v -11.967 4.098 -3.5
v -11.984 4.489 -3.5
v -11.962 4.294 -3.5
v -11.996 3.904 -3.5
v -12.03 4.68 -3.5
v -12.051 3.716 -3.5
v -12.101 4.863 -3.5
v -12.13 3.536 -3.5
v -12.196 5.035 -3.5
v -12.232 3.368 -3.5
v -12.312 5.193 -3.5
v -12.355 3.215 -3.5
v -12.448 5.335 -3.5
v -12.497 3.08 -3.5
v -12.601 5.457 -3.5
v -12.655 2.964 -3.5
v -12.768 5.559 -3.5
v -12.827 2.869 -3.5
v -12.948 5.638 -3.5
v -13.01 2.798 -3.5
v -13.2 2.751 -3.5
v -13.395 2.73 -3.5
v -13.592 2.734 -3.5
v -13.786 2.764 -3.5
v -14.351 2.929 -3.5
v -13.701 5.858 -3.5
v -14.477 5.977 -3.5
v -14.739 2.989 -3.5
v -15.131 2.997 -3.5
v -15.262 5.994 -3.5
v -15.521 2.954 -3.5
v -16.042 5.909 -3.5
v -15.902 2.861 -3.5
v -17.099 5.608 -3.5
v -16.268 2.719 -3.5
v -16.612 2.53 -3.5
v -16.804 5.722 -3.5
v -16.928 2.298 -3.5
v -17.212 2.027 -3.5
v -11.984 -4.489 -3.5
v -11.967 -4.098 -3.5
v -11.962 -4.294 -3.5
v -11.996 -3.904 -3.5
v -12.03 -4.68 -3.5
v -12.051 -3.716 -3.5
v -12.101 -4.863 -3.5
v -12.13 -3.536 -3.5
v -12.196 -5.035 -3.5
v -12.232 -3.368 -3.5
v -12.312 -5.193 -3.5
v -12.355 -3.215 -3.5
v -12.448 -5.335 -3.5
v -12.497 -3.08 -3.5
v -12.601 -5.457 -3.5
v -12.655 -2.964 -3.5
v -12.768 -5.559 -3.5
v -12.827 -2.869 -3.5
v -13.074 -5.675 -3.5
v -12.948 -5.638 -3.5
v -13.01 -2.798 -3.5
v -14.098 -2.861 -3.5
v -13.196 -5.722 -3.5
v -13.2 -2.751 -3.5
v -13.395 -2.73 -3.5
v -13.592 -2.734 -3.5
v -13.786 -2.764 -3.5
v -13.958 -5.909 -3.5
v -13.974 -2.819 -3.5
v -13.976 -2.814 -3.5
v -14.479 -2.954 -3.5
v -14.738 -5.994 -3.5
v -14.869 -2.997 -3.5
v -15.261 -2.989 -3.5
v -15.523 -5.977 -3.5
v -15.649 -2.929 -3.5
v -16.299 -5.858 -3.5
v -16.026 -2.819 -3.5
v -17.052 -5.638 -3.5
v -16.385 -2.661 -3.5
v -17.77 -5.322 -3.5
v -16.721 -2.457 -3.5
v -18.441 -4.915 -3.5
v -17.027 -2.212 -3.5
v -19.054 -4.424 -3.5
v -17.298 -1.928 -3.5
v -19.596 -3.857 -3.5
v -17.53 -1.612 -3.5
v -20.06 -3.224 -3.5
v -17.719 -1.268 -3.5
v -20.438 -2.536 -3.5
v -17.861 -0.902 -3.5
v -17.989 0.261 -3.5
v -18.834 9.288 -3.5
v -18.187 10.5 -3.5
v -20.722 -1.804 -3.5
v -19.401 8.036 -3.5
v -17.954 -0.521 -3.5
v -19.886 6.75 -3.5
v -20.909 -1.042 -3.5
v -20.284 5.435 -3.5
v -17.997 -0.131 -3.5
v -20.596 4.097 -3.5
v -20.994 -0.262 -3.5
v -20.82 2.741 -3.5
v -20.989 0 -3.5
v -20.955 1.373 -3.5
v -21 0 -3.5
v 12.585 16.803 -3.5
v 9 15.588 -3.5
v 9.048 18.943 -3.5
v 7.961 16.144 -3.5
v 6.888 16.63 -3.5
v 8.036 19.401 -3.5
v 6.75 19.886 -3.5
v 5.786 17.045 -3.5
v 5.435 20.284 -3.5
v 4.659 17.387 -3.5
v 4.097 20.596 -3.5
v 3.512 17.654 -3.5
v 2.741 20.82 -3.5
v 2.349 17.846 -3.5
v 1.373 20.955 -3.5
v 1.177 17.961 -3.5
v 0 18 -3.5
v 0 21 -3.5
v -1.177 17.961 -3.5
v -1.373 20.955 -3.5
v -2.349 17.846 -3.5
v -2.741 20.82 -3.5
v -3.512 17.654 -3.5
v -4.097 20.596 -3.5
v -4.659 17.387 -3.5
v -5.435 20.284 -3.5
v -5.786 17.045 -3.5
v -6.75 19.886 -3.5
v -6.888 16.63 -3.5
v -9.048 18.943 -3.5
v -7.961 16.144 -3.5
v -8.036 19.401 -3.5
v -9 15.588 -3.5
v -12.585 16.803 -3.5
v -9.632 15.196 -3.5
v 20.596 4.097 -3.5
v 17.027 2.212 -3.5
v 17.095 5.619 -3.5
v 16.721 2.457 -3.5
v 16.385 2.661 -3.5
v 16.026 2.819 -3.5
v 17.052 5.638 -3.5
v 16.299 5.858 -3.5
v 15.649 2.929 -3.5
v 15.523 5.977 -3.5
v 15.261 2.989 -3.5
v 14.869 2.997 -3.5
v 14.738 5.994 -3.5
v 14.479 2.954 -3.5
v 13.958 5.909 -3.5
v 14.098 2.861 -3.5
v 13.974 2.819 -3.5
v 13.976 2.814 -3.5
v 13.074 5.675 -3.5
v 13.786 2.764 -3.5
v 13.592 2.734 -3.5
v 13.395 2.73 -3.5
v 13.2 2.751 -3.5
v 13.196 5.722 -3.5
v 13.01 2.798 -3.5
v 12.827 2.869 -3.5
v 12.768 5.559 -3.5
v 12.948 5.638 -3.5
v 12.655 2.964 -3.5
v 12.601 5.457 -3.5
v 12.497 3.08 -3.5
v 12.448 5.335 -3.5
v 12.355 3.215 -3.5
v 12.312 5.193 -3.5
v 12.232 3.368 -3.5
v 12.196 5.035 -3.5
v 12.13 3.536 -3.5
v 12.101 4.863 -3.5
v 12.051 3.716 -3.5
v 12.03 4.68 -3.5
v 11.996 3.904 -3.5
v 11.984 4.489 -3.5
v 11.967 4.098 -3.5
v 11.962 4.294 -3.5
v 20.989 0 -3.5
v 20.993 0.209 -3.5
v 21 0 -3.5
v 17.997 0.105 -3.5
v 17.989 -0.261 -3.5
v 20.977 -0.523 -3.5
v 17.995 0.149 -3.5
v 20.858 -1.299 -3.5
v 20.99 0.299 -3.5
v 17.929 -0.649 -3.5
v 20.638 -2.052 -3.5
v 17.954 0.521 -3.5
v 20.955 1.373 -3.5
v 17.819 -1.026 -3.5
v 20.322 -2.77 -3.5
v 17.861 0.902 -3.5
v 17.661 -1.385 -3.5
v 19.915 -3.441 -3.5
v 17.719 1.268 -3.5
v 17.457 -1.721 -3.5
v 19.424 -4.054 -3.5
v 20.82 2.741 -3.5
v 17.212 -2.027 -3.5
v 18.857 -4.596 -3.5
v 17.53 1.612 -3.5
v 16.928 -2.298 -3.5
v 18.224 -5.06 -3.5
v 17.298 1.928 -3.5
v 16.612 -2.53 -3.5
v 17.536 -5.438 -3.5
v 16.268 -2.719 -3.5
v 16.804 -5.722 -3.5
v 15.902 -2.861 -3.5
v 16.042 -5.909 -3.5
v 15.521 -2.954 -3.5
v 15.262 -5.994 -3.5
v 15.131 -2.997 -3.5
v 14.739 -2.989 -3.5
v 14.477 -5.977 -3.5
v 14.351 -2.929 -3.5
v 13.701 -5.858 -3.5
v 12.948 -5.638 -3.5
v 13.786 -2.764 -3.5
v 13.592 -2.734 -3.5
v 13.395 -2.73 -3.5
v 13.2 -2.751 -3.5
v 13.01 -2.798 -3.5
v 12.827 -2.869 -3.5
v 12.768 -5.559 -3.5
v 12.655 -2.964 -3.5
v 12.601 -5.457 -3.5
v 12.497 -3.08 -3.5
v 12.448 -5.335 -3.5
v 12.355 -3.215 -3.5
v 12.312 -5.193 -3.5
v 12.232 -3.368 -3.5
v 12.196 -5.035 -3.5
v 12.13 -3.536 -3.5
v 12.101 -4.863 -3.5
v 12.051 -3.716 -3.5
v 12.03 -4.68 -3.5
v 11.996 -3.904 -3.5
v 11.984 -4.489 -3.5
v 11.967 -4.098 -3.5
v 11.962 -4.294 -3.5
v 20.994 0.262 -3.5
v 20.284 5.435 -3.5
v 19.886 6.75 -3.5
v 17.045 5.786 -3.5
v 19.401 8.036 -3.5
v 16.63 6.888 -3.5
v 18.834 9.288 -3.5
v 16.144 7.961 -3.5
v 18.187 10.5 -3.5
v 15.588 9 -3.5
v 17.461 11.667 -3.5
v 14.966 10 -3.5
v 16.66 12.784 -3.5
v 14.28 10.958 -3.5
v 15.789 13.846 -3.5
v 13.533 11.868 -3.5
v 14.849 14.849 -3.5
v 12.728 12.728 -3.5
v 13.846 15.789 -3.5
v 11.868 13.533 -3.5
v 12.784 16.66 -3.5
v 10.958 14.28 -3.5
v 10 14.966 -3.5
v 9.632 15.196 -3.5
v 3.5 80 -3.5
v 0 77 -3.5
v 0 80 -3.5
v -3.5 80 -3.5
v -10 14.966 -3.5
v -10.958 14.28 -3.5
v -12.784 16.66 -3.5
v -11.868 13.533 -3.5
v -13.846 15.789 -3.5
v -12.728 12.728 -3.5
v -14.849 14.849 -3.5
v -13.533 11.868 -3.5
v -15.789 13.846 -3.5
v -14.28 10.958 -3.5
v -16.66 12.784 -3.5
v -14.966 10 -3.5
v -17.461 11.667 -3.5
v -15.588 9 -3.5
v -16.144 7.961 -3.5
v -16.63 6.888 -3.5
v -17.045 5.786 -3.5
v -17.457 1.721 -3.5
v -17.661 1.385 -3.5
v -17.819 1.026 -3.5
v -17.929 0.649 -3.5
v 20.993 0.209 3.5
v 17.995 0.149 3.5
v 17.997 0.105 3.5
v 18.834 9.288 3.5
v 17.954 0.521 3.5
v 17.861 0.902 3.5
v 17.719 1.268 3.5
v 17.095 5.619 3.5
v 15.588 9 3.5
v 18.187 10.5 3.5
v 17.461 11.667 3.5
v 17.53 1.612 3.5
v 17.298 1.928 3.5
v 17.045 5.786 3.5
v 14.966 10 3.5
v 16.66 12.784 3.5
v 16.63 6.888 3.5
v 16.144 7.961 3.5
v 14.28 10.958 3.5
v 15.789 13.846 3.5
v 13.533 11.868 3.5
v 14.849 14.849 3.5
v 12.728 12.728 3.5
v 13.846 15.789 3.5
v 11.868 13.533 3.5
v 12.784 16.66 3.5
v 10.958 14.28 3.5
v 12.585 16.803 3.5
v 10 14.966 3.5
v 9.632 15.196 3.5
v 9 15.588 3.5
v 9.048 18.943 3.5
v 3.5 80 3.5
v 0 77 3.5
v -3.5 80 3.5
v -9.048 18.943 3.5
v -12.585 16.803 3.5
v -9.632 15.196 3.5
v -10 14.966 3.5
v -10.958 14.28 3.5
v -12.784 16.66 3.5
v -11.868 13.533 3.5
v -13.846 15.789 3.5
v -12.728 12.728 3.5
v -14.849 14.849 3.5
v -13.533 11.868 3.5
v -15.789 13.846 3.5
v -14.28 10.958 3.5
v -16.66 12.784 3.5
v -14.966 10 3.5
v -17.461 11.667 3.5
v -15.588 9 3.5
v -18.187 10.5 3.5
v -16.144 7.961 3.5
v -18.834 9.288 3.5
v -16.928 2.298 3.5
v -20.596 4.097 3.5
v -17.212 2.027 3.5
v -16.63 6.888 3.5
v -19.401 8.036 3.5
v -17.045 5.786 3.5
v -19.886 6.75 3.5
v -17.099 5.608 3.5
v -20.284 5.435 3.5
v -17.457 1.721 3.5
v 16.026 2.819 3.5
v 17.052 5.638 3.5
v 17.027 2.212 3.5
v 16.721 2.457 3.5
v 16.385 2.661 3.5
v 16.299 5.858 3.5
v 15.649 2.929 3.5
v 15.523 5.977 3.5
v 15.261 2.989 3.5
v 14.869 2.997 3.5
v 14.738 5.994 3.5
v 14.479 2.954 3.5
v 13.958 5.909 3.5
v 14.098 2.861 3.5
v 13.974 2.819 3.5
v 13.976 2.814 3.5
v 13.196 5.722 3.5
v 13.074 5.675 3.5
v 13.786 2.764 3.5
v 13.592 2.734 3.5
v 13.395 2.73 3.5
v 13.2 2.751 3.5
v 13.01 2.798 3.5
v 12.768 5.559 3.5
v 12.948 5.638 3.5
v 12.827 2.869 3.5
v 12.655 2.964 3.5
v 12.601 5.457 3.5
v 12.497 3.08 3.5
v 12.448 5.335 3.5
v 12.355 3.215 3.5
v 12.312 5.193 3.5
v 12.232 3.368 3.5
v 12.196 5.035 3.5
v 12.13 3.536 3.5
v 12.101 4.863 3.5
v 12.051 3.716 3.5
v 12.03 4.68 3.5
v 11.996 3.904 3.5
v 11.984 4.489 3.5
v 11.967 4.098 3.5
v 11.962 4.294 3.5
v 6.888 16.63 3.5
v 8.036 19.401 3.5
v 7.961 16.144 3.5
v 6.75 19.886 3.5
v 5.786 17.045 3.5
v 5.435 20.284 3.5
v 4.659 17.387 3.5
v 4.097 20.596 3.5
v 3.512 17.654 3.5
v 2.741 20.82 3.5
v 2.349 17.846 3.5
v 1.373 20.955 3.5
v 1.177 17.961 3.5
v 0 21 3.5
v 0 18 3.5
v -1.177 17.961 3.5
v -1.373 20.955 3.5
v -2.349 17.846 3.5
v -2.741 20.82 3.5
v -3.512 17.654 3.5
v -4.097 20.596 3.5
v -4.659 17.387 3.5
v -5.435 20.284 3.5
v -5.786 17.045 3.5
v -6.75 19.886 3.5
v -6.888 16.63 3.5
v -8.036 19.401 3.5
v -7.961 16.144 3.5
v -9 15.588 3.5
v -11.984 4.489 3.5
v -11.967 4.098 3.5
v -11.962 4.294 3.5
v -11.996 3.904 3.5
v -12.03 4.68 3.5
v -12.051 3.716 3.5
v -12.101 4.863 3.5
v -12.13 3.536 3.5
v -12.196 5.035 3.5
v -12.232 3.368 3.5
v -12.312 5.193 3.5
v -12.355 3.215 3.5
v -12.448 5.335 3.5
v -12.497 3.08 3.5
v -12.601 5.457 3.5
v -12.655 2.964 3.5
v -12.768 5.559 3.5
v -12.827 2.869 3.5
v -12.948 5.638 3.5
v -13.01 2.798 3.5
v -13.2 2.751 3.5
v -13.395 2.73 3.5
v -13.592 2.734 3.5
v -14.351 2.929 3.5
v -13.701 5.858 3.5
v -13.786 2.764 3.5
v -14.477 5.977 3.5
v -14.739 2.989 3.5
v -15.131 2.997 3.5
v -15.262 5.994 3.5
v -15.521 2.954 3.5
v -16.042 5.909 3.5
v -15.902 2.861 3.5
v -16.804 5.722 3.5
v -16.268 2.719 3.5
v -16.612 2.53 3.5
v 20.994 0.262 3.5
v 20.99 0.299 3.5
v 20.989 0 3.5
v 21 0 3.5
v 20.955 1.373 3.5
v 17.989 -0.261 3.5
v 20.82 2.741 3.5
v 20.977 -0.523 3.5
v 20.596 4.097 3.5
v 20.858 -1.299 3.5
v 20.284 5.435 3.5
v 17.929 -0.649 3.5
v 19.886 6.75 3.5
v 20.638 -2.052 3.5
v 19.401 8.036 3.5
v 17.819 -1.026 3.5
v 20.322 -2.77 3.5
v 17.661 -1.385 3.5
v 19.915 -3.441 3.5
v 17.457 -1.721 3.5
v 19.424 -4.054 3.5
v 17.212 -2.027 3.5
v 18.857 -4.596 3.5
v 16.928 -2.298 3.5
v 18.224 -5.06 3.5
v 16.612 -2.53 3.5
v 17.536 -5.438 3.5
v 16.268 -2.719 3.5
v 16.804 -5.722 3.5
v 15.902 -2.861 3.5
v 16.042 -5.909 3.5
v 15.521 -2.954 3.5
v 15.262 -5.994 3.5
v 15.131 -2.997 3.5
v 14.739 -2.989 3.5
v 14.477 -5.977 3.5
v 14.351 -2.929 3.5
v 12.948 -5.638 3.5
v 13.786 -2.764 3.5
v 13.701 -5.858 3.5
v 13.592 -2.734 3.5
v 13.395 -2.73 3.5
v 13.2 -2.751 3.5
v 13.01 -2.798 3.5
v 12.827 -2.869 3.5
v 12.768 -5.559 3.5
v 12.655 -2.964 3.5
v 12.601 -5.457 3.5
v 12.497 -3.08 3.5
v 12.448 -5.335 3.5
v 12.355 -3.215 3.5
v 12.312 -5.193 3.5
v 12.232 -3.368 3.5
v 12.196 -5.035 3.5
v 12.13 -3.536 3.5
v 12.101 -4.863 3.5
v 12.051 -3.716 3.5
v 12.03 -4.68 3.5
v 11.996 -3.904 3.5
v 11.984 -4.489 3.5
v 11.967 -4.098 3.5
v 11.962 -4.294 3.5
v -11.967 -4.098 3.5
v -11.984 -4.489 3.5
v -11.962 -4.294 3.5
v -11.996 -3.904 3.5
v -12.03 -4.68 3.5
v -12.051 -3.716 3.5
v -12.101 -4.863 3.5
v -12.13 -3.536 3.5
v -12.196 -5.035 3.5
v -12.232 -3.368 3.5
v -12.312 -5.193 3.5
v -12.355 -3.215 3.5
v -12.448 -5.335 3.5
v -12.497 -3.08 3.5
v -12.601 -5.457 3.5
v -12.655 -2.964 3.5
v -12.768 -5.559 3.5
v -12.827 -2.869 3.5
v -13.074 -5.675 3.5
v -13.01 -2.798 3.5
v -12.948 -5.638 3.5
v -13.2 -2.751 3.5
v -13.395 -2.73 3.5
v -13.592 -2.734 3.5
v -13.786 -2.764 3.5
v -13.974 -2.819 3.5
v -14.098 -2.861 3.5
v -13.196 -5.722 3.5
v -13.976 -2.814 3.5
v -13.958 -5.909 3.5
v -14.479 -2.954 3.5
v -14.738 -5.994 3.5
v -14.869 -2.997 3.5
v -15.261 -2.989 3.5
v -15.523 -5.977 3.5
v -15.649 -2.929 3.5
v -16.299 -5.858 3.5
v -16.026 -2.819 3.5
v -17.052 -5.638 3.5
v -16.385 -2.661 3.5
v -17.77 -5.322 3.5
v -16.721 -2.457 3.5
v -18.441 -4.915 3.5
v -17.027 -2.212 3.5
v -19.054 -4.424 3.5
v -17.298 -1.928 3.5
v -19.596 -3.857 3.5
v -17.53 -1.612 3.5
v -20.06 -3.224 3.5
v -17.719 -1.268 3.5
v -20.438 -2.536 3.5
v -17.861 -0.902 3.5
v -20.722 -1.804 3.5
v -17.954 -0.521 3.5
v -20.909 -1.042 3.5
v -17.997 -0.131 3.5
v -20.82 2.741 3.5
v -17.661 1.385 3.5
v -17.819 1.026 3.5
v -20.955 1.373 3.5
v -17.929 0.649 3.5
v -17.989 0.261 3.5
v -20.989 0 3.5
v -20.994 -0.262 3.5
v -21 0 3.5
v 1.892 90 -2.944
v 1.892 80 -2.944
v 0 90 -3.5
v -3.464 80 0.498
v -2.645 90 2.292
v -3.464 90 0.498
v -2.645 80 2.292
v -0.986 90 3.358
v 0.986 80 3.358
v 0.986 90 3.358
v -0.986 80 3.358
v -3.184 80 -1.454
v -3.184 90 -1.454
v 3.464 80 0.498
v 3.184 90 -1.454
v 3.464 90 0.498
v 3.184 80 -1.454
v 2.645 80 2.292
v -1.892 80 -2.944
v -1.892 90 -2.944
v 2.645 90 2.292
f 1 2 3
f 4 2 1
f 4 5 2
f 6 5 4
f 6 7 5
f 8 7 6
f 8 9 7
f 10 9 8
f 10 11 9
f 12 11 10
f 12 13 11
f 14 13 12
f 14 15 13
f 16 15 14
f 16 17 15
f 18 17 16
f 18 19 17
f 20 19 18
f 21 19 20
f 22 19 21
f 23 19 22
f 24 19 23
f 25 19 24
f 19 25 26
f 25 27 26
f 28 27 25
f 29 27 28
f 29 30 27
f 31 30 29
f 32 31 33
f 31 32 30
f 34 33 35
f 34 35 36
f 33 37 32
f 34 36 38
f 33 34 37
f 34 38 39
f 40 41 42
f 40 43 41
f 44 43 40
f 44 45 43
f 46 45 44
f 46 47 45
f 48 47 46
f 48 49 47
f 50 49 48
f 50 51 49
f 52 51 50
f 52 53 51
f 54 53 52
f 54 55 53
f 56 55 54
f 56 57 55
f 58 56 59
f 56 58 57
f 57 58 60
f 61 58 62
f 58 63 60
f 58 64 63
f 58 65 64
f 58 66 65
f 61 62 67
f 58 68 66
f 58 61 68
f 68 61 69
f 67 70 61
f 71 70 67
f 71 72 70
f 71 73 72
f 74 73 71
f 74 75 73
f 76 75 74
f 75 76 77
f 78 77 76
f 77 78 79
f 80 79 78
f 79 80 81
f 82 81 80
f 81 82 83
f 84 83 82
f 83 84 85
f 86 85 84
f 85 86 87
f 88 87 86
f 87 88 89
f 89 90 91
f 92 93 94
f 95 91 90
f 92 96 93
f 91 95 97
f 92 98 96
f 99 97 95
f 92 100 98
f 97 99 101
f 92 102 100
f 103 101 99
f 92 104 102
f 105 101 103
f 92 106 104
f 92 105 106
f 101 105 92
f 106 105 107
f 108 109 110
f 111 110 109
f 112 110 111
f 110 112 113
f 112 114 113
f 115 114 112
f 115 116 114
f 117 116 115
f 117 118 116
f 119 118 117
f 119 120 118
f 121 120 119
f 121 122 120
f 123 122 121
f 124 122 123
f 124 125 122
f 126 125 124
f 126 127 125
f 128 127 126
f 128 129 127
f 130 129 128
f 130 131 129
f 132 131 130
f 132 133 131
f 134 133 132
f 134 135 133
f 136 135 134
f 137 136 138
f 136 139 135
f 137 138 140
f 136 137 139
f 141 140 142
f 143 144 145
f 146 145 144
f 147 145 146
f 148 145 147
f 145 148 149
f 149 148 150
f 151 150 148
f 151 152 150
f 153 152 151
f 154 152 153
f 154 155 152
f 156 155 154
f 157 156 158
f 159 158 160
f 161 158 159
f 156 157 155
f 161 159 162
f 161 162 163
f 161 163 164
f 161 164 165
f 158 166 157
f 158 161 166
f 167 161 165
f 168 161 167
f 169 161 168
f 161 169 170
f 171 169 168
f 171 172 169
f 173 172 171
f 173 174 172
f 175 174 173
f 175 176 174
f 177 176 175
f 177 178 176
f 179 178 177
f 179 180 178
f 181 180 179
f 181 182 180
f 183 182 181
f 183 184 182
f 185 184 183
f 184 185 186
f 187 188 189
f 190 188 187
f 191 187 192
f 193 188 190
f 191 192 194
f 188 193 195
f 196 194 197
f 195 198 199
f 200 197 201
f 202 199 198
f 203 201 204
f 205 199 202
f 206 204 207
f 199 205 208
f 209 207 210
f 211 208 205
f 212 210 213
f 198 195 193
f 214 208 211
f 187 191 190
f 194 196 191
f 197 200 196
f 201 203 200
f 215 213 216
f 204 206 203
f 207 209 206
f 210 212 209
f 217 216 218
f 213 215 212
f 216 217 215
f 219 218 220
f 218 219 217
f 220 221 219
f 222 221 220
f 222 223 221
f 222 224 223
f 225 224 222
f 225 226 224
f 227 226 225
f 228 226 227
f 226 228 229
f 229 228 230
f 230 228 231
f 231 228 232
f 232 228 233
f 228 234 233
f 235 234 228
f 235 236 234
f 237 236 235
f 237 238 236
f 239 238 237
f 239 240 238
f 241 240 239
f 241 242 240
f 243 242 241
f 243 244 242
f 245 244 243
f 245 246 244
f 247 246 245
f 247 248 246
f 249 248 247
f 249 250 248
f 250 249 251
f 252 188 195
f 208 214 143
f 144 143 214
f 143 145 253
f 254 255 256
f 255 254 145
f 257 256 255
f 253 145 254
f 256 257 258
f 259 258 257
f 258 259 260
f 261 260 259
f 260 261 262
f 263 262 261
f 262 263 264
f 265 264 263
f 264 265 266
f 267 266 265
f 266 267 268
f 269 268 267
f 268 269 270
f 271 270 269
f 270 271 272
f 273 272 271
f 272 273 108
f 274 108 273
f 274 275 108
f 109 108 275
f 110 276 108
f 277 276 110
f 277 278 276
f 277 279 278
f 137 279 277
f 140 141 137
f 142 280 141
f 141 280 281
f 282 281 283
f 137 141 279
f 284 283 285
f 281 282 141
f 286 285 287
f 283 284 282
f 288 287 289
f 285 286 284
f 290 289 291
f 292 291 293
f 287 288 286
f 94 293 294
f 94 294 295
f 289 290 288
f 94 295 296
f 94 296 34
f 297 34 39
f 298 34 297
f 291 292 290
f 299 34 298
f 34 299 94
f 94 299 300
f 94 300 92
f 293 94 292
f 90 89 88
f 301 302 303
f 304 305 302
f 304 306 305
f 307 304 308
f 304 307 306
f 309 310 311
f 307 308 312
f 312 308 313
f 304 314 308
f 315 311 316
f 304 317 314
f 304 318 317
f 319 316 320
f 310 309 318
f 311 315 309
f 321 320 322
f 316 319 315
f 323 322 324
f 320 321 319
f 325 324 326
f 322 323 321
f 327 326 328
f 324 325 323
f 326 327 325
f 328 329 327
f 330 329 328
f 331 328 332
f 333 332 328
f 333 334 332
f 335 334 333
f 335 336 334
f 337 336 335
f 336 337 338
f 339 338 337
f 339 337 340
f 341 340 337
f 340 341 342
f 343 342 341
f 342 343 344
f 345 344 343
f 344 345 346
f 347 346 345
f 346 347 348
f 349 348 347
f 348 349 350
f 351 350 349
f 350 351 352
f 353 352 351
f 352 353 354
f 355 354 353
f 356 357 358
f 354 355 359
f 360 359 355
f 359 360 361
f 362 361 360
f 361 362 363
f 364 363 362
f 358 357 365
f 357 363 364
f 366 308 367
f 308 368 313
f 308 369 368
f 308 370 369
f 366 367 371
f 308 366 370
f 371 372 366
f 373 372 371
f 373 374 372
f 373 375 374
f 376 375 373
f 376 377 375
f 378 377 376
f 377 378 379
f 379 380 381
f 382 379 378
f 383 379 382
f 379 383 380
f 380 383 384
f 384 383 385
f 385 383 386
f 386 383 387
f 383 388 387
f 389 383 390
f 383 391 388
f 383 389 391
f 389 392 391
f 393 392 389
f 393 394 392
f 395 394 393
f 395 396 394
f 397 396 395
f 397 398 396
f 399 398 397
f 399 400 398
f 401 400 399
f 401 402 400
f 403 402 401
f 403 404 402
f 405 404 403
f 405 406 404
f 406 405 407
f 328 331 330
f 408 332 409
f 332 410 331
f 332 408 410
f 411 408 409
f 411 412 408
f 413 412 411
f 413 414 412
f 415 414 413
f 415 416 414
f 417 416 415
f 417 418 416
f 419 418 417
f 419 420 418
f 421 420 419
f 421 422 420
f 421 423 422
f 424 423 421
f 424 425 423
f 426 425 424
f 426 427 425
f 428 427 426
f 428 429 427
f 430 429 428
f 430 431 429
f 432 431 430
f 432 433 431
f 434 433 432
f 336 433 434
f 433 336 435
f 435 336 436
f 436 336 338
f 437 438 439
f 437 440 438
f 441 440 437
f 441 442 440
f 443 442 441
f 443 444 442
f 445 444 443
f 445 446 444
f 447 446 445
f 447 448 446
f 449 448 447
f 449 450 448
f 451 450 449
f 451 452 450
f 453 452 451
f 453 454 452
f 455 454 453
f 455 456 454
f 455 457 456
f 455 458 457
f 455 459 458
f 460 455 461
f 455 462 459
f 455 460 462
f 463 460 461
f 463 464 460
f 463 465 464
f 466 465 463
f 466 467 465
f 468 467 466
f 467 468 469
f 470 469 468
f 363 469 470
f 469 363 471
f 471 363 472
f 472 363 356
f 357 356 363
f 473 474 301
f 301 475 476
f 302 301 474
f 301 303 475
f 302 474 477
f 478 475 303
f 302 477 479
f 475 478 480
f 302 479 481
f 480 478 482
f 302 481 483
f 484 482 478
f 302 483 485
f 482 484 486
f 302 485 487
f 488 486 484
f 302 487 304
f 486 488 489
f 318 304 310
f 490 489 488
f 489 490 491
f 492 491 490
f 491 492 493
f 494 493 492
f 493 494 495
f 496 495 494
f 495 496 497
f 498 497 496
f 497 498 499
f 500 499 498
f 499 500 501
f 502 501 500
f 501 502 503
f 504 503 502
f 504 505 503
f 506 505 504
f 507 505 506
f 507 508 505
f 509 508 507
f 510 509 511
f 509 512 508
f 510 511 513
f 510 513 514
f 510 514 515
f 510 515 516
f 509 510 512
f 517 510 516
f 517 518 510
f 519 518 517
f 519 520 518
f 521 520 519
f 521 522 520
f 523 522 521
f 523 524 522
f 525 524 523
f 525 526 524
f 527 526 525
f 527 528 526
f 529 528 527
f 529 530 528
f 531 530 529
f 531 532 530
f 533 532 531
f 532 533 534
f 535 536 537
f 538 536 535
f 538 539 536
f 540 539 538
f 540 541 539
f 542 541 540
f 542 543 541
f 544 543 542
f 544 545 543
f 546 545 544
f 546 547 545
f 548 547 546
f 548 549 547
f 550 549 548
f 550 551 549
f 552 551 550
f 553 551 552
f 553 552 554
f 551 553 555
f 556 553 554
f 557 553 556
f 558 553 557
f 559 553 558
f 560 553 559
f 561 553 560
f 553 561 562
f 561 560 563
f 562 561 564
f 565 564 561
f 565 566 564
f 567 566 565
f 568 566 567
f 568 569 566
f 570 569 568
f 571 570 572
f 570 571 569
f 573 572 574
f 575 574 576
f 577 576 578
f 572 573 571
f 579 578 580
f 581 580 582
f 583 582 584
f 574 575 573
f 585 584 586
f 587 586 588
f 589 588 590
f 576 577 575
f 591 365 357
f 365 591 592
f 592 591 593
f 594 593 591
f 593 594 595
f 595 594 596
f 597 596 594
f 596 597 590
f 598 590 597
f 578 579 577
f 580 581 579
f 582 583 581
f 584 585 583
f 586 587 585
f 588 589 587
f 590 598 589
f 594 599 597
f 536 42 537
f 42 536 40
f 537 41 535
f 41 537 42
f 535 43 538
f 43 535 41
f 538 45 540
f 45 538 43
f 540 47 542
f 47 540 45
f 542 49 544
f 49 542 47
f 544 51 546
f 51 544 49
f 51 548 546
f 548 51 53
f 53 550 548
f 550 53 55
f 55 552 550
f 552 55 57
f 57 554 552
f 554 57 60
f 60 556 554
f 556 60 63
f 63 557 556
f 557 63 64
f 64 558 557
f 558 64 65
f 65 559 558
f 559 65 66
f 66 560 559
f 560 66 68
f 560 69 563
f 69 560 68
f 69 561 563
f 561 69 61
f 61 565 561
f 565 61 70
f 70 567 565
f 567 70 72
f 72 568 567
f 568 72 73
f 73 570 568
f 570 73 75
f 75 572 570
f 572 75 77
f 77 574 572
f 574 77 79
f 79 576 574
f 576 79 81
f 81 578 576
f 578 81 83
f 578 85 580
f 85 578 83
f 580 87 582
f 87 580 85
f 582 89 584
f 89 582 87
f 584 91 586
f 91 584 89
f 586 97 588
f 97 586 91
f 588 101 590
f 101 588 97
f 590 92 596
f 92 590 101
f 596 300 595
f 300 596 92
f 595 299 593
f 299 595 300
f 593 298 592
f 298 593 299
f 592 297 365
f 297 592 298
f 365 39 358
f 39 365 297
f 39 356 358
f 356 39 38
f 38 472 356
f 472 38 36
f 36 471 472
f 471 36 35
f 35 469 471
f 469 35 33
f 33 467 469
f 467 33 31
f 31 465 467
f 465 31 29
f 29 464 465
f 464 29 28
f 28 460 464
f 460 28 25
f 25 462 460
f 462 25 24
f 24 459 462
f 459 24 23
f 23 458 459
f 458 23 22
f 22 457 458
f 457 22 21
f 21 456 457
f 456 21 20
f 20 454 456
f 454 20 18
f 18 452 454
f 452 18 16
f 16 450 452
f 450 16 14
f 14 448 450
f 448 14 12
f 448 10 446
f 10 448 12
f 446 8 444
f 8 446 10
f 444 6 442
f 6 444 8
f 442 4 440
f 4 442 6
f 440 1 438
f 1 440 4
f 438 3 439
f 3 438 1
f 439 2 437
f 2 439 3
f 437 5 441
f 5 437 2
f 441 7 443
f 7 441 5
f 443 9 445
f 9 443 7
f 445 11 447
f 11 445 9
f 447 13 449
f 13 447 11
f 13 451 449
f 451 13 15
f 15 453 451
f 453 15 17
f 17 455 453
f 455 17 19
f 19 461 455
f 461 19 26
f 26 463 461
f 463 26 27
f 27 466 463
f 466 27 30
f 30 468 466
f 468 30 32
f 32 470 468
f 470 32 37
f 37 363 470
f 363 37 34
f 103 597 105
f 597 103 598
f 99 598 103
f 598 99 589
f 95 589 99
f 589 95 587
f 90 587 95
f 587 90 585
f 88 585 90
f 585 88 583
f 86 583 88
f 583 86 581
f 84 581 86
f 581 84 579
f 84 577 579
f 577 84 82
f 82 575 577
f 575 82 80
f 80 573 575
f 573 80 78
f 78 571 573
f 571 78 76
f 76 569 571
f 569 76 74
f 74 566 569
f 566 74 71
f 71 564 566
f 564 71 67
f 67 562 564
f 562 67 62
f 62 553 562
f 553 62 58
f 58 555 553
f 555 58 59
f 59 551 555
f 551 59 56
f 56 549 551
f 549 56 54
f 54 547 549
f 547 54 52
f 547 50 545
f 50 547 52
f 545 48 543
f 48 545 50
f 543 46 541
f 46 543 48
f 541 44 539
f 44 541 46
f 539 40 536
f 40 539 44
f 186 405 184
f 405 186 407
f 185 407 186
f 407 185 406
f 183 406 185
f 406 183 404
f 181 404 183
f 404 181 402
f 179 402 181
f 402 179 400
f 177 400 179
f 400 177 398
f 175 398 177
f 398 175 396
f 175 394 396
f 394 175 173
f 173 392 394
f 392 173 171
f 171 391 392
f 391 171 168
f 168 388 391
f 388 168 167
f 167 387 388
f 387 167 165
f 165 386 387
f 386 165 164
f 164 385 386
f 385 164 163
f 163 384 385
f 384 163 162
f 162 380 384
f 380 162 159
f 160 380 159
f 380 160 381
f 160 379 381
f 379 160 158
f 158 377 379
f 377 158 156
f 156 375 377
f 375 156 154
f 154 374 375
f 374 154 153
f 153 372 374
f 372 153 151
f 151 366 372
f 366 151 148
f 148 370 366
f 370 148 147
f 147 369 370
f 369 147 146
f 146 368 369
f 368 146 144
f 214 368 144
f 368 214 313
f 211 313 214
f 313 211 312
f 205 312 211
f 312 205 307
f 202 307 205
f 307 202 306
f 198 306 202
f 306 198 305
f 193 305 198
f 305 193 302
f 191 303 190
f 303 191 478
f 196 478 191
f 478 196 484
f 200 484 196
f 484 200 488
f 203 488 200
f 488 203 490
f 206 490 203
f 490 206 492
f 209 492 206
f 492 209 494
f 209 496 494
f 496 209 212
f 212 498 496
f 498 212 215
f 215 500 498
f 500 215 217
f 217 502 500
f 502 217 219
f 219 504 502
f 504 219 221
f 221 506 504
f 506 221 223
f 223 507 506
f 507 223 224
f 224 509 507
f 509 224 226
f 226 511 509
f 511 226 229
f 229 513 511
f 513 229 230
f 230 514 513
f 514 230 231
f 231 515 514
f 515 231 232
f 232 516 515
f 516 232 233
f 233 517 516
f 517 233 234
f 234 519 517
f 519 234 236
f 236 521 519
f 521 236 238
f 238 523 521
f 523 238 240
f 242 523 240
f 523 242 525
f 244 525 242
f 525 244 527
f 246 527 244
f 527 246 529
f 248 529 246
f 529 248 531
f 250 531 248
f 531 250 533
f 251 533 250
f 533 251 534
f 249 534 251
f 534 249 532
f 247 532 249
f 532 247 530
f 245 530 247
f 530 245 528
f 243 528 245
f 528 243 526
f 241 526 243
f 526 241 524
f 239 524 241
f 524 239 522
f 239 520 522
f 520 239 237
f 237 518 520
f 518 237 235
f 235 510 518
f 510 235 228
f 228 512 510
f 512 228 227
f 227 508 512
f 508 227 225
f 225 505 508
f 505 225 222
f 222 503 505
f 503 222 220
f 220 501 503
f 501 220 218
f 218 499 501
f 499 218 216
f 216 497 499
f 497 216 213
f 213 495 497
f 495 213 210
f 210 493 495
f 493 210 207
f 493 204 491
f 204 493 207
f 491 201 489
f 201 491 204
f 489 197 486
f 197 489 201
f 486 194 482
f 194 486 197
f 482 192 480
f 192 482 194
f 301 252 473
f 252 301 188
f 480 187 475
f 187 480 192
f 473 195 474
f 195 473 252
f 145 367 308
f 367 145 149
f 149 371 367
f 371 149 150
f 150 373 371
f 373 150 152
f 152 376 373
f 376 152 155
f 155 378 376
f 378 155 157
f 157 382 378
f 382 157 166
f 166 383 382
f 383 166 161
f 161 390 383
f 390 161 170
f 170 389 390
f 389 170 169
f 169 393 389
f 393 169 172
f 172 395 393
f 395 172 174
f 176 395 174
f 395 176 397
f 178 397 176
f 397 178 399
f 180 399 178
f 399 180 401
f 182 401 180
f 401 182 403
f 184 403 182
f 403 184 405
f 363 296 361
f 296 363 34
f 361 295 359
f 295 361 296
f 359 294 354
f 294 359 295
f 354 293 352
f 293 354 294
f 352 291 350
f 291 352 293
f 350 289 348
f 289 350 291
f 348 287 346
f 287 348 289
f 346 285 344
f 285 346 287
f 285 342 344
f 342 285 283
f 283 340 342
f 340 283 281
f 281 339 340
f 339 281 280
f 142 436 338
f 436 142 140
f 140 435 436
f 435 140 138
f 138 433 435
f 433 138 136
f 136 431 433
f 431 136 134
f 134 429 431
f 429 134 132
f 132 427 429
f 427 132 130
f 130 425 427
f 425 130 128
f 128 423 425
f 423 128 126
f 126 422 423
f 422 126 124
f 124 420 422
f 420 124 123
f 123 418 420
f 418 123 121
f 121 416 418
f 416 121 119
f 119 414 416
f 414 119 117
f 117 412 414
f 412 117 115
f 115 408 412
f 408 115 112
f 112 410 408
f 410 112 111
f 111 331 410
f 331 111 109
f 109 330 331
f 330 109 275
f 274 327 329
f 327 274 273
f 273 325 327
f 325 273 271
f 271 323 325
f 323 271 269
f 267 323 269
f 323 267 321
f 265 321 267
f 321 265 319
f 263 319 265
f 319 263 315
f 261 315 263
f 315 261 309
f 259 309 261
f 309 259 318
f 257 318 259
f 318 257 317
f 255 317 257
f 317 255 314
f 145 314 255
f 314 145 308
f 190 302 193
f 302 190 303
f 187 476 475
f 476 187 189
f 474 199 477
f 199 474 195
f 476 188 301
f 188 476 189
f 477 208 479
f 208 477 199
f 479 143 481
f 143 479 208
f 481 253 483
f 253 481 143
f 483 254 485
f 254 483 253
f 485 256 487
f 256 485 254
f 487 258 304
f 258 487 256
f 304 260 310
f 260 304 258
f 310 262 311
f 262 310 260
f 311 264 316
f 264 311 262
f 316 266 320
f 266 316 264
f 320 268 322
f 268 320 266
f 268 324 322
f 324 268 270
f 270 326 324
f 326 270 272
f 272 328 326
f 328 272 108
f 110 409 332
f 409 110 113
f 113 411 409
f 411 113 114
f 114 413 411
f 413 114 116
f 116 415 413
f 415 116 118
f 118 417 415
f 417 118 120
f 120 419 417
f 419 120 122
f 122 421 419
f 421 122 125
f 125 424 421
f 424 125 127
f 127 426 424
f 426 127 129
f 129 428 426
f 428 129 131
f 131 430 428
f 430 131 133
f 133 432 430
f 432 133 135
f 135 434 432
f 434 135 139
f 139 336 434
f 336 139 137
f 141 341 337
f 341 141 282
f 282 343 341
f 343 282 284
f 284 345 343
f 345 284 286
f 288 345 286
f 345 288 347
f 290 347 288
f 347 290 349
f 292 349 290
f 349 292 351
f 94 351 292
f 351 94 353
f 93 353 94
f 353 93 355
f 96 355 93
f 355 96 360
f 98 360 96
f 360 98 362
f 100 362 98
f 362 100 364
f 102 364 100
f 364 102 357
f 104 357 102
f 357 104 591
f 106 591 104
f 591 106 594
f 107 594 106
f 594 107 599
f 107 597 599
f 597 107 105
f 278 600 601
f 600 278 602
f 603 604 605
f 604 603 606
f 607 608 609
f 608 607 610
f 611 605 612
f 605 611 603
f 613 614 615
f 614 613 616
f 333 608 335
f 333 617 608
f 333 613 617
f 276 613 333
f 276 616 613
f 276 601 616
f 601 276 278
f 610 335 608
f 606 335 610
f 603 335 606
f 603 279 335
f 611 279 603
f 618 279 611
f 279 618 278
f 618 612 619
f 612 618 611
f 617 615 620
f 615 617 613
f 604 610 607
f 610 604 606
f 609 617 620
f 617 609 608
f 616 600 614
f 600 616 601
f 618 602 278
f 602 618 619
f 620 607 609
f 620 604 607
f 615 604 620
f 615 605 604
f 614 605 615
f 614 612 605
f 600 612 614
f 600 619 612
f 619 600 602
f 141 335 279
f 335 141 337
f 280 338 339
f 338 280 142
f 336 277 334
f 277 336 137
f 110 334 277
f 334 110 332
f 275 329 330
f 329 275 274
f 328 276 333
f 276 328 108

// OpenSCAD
// --- params ---

extrusion_height=7;
thickness=3;
peg_height=10;
peg_radius=3.5;
conductor_radius=3;
conductor_gap=30;
conductor_distance=90;
clip_angle=220;
struts_distance=30;

// --- model ---

clamp();
clips();
peg();
struts();

// --- modules ---

module clamp() {
    clamp_radius=conductor_gap / 2  + conductor_radius;
    linear_extrude(extrusion_height, center=true)
    arc(clamp_radius, [0, 180], fn=96);
}

module clips() {
    translate([-conductor_gap / 2, 0, 0])
    rotate(90)
    clip();

    translate([conductor_gap / 2, 0, 0])
    rotate(-90)
    clip();
}

module clip() {
    linear_extrude(extrusion_height, center=true)
    rotate((180 - clip_angle) / 2)
    union() {
        arc(conductor_radius, [0, clip_angle], fn=48);
        translate([conductor_radius + thickness / 2, 0, 0])
        circle(thickness / 2, $fn=48);
        rotate(clip_angle - 180)
        translate([-conductor_radius - thickness / 2, 0, 0])
        circle(thickness / 2, $fn=48);
    }
}

module peg() {
    translate([0, conductor_distance, 0])
    rotate([90, 90, 0])
    cylinder(r=peg_radius, h=peg_height);
}

module struts() {
    clamp_radius=conductor_gap / 2  + conductor_radius;
    linear_extrude(extrusion_height, center=true)
    difference() {
        polygon(
            points = [
                [struts_distance / 2, 0],
                [-struts_distance / 2, 0],
                [peg_radius, conductor_distance - peg_height],
                [-peg_radius, conductor_distance - peg_height],
                [struts_distance / 2 - thickness, 0],
                [-struts_distance / 2 + thickness, 0],
                [0, conductor_distance - peg_height - thickness],
            ],
            paths = [[0,1,3,2], [4,5,6]]
        );
        sector(clamp_radius, [0, 180], fn=96);
    }
}

module sector(radius, angles, fn=24) {
    r = radius / cos(180 / fn);
    step = -360 / fn;

    points = concat([[0, 0]],
        [for(a = [angles[0] : step : angles[1] - 360]) 
            [r * cos(a), r * sin(a)]
        ],
        [[r * cos(angles[1]), r * sin(angles[1])]]
    );

    difference() {
        circle(radius, $fn=fn);
        polygon(points);
    }
}

module arc(radius, angles, thickness = thickness, fn=24) {
    difference() {
        sector(radius + thickness, angles, fn);
        sector(radius, angles, fn);
    }
} 
